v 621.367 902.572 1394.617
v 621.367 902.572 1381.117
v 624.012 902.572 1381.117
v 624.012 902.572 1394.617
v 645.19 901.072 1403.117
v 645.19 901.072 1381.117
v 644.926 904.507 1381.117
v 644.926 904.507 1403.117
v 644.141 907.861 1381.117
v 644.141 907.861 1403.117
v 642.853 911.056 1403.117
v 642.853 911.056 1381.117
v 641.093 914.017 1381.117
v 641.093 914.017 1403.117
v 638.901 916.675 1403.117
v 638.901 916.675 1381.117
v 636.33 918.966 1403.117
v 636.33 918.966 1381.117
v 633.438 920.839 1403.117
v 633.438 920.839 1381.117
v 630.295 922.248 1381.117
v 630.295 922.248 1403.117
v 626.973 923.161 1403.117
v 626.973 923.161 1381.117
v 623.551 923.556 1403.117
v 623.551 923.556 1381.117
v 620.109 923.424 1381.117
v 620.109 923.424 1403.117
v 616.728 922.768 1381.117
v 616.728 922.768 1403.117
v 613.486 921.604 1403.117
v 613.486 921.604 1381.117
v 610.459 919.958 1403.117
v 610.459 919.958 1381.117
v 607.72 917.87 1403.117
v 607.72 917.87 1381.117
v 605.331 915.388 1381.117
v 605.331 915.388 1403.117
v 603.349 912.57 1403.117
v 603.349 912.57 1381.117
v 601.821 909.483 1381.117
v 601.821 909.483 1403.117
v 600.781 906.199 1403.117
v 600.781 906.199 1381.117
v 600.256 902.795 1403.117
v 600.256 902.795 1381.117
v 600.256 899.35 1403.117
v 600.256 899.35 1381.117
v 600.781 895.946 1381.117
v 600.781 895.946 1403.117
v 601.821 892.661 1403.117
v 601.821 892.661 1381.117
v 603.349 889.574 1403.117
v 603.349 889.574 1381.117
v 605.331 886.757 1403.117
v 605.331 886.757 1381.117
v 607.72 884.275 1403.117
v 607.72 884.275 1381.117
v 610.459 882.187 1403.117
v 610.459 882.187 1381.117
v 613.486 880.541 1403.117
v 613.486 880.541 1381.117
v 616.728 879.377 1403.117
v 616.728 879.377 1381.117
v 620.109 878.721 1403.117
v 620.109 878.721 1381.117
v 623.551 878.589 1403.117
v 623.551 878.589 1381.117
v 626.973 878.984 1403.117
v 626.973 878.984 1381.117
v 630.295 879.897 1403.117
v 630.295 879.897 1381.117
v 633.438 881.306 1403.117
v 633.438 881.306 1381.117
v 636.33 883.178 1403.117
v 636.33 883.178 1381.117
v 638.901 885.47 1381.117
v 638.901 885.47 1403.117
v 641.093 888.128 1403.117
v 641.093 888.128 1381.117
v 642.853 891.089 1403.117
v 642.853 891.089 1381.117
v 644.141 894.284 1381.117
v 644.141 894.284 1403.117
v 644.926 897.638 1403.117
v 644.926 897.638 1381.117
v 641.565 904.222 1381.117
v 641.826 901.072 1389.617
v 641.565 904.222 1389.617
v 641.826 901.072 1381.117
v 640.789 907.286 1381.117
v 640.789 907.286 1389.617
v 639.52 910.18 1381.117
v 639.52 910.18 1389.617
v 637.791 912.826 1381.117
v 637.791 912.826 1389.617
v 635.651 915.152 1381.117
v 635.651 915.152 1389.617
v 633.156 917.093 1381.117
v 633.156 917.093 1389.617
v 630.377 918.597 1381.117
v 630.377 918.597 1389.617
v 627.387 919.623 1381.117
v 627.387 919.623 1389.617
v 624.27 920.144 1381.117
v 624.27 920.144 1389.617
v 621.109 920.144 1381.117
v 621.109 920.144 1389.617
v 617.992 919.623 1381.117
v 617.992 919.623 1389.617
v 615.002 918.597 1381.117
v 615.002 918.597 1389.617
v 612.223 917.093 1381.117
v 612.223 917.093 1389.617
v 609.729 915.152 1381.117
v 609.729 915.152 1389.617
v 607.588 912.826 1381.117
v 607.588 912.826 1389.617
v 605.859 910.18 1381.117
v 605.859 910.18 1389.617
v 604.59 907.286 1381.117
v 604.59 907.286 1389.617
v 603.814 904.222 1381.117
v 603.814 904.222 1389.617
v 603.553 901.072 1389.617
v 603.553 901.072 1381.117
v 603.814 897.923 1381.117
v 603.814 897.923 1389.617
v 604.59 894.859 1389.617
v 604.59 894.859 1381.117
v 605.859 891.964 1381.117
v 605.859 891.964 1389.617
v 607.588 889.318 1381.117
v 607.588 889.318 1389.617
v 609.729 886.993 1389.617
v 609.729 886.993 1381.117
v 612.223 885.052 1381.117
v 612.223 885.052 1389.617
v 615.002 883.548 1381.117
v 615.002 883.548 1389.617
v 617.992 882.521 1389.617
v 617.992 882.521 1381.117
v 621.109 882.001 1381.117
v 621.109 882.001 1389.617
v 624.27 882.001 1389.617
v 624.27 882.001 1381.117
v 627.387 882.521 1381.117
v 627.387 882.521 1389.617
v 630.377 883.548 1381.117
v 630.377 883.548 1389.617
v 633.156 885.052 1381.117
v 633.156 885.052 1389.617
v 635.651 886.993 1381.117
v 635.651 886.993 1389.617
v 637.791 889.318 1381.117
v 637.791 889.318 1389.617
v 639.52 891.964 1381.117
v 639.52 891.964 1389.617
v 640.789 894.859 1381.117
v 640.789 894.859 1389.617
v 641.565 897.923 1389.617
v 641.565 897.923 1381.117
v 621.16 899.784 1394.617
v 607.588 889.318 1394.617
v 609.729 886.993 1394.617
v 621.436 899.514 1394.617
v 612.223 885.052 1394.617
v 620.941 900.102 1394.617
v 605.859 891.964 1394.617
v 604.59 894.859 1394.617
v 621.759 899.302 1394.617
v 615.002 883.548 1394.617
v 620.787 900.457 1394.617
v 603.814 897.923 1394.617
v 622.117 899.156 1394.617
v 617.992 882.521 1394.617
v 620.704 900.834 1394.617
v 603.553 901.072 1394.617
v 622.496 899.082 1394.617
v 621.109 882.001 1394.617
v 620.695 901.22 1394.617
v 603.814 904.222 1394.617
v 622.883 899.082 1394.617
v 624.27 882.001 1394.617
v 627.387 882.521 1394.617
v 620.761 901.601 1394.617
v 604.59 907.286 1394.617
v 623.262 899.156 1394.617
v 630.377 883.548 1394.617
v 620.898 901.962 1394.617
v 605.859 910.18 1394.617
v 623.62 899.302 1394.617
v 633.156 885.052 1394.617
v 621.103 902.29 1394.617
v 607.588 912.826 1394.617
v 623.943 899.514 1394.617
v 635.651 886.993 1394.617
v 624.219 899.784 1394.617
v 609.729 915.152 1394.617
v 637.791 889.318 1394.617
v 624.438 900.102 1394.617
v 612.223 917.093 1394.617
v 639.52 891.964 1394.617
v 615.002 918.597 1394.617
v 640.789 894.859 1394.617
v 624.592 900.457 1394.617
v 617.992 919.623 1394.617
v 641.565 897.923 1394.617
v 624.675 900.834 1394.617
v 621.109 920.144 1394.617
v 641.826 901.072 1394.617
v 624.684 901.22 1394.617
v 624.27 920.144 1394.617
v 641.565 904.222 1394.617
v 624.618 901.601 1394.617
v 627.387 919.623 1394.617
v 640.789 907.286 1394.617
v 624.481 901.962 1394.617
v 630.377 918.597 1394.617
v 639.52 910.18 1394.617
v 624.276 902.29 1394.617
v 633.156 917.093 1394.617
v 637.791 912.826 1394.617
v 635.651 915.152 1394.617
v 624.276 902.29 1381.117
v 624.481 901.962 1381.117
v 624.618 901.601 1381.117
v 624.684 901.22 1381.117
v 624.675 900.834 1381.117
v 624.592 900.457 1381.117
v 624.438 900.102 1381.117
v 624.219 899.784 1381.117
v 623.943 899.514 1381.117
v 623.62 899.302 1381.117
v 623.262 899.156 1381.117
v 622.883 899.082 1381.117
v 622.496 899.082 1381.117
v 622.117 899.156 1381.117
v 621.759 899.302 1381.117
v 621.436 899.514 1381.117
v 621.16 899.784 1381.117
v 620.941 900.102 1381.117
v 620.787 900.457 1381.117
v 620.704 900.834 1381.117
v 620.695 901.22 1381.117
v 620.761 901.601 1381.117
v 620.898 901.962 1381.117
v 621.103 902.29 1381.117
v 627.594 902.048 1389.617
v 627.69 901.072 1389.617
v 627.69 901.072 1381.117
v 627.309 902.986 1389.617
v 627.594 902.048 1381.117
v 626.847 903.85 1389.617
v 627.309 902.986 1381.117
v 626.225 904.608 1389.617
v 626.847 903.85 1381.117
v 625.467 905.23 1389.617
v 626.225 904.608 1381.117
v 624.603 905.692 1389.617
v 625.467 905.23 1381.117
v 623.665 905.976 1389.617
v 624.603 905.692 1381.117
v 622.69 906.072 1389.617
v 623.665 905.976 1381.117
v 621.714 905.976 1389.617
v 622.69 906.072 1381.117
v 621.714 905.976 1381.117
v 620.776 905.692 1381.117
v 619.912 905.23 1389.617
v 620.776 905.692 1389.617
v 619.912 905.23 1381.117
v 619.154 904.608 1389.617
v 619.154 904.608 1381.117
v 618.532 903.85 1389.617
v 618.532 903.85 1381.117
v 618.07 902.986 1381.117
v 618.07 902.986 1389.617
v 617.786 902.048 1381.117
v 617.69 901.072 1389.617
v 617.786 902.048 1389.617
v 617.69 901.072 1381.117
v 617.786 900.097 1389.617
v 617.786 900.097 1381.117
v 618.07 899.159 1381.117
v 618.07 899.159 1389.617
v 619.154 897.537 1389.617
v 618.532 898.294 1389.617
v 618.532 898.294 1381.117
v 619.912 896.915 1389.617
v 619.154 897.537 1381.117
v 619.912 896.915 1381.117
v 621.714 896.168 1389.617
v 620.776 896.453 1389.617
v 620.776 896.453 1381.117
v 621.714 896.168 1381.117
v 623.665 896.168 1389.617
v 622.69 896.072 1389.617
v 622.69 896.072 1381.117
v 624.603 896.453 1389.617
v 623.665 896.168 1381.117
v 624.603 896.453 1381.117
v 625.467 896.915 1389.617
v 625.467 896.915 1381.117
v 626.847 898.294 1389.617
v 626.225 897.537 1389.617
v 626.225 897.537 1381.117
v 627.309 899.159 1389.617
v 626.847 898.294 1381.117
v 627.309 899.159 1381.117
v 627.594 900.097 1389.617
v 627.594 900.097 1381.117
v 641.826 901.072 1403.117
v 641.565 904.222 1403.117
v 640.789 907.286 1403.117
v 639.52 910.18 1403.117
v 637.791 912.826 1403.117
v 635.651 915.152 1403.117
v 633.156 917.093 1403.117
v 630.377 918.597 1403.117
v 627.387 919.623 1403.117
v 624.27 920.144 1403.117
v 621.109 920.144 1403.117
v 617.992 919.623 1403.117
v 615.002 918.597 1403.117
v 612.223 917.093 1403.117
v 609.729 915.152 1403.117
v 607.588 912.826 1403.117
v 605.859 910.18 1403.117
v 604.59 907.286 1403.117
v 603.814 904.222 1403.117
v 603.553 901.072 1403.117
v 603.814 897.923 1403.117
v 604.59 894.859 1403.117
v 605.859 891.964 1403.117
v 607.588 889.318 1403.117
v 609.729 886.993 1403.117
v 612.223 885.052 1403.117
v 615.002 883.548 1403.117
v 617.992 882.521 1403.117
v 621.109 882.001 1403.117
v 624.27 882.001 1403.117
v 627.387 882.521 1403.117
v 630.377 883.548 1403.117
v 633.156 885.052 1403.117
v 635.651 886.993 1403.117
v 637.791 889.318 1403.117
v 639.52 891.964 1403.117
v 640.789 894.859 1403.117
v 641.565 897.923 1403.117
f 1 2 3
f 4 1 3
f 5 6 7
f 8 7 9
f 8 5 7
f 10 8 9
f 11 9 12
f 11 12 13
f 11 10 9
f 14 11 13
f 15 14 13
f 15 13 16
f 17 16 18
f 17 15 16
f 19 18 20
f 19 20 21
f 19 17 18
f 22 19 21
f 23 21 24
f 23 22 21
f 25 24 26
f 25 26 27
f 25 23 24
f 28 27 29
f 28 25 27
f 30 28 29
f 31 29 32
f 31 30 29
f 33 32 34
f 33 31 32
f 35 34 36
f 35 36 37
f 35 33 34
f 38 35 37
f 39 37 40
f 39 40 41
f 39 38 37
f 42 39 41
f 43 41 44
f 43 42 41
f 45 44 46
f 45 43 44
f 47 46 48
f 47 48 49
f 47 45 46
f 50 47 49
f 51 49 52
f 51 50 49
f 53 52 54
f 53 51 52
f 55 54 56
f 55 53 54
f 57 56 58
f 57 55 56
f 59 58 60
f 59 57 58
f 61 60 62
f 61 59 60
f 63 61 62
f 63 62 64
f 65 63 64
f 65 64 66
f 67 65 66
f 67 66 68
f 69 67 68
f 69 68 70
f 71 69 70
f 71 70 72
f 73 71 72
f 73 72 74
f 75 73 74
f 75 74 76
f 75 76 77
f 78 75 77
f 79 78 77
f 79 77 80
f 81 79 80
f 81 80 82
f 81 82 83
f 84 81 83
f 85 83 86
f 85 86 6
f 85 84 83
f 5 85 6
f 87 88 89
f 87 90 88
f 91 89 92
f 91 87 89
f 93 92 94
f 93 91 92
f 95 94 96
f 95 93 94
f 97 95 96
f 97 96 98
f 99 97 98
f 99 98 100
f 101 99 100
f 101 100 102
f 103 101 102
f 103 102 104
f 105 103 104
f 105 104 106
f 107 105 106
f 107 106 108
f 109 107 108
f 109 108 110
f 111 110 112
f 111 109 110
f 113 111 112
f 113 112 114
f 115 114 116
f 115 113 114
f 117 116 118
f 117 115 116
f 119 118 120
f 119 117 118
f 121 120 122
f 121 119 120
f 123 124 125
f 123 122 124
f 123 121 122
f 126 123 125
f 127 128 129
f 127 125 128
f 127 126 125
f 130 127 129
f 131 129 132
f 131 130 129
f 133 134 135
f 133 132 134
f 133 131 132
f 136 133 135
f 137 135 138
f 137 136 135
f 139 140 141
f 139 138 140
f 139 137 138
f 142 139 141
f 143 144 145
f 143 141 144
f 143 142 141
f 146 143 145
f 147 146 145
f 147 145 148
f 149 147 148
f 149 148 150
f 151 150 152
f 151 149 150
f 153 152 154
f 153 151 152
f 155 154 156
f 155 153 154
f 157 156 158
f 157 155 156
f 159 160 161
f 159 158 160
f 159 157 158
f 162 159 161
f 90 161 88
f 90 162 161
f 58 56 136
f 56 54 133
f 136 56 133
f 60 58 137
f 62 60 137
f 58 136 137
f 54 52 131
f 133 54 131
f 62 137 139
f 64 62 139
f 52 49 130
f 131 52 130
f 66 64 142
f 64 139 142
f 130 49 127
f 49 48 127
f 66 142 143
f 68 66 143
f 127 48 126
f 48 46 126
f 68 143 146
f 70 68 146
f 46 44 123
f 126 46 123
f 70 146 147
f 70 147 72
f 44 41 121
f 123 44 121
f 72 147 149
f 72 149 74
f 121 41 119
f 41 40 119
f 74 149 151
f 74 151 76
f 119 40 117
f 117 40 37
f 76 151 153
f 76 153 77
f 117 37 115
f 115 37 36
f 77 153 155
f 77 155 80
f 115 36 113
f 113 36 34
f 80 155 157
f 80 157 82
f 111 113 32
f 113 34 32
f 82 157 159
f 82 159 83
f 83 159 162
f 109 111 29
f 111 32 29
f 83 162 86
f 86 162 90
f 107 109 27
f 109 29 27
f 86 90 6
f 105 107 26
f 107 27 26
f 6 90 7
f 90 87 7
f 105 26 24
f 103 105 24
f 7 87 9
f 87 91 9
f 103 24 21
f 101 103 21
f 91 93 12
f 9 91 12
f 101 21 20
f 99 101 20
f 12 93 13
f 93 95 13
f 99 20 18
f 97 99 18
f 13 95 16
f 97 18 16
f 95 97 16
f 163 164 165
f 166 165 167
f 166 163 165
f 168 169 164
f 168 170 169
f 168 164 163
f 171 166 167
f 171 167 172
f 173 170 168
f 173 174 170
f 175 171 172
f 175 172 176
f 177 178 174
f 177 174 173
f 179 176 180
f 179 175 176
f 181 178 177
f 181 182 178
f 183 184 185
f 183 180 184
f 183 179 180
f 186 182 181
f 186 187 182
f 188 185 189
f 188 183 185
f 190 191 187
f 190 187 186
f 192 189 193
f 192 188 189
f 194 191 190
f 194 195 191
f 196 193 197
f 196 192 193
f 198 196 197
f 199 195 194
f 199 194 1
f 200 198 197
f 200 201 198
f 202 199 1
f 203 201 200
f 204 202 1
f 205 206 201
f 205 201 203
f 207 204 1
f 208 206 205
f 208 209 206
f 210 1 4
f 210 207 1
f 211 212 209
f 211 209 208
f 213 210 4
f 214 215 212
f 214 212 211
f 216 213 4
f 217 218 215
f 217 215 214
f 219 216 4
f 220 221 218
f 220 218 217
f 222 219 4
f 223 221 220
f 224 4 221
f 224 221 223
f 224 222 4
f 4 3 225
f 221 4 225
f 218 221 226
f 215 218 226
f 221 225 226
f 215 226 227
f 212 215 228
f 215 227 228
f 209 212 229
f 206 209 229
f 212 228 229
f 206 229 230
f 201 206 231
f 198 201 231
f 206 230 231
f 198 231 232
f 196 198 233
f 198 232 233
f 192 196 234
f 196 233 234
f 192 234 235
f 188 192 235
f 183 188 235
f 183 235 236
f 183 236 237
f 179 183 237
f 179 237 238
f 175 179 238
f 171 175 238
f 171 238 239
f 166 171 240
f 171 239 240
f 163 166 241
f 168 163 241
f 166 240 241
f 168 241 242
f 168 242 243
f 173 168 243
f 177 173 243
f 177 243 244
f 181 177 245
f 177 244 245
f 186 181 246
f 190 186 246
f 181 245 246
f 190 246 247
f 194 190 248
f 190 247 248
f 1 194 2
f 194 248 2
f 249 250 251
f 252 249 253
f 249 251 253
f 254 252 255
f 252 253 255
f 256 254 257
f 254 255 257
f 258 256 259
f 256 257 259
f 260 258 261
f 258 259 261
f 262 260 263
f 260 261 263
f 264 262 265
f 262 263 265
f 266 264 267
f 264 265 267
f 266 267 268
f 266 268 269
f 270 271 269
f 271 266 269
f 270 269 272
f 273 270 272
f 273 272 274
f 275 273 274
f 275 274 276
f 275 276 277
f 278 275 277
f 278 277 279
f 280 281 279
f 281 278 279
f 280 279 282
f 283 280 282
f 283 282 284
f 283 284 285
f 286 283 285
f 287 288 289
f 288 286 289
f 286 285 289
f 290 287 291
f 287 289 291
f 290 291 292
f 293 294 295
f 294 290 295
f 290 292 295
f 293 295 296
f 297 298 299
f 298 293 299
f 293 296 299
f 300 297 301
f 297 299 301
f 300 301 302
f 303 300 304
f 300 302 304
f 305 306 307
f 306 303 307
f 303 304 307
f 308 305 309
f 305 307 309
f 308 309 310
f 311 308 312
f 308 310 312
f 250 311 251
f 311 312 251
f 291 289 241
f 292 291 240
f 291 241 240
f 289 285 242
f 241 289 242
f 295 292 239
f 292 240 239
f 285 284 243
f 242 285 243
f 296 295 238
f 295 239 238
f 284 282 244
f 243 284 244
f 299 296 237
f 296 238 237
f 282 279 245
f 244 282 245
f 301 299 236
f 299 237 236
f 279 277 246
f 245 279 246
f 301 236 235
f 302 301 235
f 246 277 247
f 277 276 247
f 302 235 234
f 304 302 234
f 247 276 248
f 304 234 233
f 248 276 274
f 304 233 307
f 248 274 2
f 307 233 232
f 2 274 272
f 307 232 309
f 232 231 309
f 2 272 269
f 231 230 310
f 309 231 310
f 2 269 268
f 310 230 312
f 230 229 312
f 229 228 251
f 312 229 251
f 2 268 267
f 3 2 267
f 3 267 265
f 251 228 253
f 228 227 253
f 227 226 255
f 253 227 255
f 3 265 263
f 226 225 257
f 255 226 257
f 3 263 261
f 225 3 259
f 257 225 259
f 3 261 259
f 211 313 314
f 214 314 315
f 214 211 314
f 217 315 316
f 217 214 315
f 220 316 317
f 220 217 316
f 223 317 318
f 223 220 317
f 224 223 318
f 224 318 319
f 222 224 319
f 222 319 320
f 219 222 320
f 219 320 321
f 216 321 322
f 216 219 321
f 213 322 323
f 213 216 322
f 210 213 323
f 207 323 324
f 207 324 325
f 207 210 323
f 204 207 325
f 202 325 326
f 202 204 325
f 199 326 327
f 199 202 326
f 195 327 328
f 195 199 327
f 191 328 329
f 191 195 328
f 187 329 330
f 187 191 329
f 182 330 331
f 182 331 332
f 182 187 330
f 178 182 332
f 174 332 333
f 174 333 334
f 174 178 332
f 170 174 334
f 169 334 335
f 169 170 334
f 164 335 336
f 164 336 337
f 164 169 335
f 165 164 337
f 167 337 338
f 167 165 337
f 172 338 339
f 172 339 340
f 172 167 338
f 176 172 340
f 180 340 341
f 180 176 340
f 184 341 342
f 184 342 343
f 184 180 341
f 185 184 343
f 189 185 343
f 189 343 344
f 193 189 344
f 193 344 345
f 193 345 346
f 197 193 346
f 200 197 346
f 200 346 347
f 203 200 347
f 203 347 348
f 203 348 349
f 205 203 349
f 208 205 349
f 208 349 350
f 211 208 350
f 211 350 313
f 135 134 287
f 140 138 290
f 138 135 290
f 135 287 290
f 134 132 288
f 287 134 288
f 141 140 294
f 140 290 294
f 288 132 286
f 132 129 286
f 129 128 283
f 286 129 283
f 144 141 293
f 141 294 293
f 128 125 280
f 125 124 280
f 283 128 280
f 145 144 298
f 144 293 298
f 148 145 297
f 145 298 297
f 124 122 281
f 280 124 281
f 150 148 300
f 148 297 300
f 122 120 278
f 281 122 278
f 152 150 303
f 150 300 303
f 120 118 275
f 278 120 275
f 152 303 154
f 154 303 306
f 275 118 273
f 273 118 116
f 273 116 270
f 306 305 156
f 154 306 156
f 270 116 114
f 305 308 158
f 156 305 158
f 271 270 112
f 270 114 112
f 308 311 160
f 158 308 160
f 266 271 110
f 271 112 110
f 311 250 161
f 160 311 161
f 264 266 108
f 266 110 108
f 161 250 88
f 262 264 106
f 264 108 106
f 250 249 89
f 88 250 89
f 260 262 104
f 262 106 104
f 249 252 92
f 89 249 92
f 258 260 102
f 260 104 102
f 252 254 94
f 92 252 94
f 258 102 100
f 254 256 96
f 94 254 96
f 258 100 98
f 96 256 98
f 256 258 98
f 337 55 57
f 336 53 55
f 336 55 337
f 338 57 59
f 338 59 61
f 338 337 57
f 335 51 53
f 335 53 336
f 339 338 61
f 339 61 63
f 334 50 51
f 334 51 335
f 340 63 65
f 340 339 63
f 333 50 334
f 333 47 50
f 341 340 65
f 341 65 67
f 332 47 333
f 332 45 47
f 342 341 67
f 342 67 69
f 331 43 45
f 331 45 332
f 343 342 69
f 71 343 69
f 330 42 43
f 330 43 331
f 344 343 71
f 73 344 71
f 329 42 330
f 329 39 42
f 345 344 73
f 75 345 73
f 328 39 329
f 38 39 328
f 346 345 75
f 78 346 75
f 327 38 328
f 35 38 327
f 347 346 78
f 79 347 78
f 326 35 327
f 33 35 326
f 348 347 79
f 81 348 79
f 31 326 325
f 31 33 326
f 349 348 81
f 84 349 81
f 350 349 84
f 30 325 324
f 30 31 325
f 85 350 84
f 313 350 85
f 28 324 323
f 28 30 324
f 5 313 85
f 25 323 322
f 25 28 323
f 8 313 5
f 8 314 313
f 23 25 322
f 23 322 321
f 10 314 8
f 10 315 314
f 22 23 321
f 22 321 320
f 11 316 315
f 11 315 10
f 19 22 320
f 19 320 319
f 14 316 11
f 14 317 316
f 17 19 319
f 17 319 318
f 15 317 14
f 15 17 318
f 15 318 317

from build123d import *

# Parameters (mm, degrees)
SKETCH1_R           = 5
BOSS_EXTRUDE2_DEPTH = 13.5
SKETCH3_R           = 22.5
SKETCH3_R_2         = 19.136659322
BOSS_EXTRUDE3_DEPTH = 11
SKETCH4_R           = 20
SKETCH4_R_2         = 4.293447478
BOSS_EXTRUDE4_DEPTH = 2.5


with BuildPart() as part:
    # Sketch1 → Boss-Extrude2 (new body)
    with BuildSketch(Plane.XY.offset(1381.117015566)):
        with Locations((622.689594412, 901.072344281)):
            Circle(SKETCH1_R)
        with BuildLine():
            Line((621.366718756, 902.572344281), (624.012470067, 902.572344281))
            ThreePointArc((624.012470067, 902.572344281), (622.689594412, 899.072344281), (621.366718756, 902.572344281))
        make_face(mode=Mode.SUBTRACT)
    extrude(amount=BOSS_EXTRUDE2_DEPTH)



with BuildPart() as body_2:
    # Sketch3 → Boss-Extrude3 (new, symmetric)
    with BuildSketch(Plane.XY.offset(1392.117015566)):
        with Locations((622.689594412, 901.072344281)):
            Circle(SKETCH3_R)
        with Locations((622.689594412, 901.072344281)):
            Circle(SKETCH3_R_2, mode=Mode.SUBTRACT)
    extrude(amount=BOSS_EXTRUDE3_DEPTH, both=True)


with BuildPart() as part_1:
    add(part.part)

    add(body_2.part)  # Boss-Extrude4 merges body 2
    # Sketch4 → Boss-Extrude4 (add, symmetric)
    with BuildSketch(Plane.XY.offset(1392.117015566)):
        with Locations((622.689594412, 901.072344281)):
            Circle(SKETCH4_R)
        with Locations((622.689594412, 901.072344281)):
            Circle(SKETCH4_R_2, mode=Mode.SUBTRACT)
    extrude(amount=BOSS_EXTRUDE4_DEPTH, both=True)


solid = part_1.part
